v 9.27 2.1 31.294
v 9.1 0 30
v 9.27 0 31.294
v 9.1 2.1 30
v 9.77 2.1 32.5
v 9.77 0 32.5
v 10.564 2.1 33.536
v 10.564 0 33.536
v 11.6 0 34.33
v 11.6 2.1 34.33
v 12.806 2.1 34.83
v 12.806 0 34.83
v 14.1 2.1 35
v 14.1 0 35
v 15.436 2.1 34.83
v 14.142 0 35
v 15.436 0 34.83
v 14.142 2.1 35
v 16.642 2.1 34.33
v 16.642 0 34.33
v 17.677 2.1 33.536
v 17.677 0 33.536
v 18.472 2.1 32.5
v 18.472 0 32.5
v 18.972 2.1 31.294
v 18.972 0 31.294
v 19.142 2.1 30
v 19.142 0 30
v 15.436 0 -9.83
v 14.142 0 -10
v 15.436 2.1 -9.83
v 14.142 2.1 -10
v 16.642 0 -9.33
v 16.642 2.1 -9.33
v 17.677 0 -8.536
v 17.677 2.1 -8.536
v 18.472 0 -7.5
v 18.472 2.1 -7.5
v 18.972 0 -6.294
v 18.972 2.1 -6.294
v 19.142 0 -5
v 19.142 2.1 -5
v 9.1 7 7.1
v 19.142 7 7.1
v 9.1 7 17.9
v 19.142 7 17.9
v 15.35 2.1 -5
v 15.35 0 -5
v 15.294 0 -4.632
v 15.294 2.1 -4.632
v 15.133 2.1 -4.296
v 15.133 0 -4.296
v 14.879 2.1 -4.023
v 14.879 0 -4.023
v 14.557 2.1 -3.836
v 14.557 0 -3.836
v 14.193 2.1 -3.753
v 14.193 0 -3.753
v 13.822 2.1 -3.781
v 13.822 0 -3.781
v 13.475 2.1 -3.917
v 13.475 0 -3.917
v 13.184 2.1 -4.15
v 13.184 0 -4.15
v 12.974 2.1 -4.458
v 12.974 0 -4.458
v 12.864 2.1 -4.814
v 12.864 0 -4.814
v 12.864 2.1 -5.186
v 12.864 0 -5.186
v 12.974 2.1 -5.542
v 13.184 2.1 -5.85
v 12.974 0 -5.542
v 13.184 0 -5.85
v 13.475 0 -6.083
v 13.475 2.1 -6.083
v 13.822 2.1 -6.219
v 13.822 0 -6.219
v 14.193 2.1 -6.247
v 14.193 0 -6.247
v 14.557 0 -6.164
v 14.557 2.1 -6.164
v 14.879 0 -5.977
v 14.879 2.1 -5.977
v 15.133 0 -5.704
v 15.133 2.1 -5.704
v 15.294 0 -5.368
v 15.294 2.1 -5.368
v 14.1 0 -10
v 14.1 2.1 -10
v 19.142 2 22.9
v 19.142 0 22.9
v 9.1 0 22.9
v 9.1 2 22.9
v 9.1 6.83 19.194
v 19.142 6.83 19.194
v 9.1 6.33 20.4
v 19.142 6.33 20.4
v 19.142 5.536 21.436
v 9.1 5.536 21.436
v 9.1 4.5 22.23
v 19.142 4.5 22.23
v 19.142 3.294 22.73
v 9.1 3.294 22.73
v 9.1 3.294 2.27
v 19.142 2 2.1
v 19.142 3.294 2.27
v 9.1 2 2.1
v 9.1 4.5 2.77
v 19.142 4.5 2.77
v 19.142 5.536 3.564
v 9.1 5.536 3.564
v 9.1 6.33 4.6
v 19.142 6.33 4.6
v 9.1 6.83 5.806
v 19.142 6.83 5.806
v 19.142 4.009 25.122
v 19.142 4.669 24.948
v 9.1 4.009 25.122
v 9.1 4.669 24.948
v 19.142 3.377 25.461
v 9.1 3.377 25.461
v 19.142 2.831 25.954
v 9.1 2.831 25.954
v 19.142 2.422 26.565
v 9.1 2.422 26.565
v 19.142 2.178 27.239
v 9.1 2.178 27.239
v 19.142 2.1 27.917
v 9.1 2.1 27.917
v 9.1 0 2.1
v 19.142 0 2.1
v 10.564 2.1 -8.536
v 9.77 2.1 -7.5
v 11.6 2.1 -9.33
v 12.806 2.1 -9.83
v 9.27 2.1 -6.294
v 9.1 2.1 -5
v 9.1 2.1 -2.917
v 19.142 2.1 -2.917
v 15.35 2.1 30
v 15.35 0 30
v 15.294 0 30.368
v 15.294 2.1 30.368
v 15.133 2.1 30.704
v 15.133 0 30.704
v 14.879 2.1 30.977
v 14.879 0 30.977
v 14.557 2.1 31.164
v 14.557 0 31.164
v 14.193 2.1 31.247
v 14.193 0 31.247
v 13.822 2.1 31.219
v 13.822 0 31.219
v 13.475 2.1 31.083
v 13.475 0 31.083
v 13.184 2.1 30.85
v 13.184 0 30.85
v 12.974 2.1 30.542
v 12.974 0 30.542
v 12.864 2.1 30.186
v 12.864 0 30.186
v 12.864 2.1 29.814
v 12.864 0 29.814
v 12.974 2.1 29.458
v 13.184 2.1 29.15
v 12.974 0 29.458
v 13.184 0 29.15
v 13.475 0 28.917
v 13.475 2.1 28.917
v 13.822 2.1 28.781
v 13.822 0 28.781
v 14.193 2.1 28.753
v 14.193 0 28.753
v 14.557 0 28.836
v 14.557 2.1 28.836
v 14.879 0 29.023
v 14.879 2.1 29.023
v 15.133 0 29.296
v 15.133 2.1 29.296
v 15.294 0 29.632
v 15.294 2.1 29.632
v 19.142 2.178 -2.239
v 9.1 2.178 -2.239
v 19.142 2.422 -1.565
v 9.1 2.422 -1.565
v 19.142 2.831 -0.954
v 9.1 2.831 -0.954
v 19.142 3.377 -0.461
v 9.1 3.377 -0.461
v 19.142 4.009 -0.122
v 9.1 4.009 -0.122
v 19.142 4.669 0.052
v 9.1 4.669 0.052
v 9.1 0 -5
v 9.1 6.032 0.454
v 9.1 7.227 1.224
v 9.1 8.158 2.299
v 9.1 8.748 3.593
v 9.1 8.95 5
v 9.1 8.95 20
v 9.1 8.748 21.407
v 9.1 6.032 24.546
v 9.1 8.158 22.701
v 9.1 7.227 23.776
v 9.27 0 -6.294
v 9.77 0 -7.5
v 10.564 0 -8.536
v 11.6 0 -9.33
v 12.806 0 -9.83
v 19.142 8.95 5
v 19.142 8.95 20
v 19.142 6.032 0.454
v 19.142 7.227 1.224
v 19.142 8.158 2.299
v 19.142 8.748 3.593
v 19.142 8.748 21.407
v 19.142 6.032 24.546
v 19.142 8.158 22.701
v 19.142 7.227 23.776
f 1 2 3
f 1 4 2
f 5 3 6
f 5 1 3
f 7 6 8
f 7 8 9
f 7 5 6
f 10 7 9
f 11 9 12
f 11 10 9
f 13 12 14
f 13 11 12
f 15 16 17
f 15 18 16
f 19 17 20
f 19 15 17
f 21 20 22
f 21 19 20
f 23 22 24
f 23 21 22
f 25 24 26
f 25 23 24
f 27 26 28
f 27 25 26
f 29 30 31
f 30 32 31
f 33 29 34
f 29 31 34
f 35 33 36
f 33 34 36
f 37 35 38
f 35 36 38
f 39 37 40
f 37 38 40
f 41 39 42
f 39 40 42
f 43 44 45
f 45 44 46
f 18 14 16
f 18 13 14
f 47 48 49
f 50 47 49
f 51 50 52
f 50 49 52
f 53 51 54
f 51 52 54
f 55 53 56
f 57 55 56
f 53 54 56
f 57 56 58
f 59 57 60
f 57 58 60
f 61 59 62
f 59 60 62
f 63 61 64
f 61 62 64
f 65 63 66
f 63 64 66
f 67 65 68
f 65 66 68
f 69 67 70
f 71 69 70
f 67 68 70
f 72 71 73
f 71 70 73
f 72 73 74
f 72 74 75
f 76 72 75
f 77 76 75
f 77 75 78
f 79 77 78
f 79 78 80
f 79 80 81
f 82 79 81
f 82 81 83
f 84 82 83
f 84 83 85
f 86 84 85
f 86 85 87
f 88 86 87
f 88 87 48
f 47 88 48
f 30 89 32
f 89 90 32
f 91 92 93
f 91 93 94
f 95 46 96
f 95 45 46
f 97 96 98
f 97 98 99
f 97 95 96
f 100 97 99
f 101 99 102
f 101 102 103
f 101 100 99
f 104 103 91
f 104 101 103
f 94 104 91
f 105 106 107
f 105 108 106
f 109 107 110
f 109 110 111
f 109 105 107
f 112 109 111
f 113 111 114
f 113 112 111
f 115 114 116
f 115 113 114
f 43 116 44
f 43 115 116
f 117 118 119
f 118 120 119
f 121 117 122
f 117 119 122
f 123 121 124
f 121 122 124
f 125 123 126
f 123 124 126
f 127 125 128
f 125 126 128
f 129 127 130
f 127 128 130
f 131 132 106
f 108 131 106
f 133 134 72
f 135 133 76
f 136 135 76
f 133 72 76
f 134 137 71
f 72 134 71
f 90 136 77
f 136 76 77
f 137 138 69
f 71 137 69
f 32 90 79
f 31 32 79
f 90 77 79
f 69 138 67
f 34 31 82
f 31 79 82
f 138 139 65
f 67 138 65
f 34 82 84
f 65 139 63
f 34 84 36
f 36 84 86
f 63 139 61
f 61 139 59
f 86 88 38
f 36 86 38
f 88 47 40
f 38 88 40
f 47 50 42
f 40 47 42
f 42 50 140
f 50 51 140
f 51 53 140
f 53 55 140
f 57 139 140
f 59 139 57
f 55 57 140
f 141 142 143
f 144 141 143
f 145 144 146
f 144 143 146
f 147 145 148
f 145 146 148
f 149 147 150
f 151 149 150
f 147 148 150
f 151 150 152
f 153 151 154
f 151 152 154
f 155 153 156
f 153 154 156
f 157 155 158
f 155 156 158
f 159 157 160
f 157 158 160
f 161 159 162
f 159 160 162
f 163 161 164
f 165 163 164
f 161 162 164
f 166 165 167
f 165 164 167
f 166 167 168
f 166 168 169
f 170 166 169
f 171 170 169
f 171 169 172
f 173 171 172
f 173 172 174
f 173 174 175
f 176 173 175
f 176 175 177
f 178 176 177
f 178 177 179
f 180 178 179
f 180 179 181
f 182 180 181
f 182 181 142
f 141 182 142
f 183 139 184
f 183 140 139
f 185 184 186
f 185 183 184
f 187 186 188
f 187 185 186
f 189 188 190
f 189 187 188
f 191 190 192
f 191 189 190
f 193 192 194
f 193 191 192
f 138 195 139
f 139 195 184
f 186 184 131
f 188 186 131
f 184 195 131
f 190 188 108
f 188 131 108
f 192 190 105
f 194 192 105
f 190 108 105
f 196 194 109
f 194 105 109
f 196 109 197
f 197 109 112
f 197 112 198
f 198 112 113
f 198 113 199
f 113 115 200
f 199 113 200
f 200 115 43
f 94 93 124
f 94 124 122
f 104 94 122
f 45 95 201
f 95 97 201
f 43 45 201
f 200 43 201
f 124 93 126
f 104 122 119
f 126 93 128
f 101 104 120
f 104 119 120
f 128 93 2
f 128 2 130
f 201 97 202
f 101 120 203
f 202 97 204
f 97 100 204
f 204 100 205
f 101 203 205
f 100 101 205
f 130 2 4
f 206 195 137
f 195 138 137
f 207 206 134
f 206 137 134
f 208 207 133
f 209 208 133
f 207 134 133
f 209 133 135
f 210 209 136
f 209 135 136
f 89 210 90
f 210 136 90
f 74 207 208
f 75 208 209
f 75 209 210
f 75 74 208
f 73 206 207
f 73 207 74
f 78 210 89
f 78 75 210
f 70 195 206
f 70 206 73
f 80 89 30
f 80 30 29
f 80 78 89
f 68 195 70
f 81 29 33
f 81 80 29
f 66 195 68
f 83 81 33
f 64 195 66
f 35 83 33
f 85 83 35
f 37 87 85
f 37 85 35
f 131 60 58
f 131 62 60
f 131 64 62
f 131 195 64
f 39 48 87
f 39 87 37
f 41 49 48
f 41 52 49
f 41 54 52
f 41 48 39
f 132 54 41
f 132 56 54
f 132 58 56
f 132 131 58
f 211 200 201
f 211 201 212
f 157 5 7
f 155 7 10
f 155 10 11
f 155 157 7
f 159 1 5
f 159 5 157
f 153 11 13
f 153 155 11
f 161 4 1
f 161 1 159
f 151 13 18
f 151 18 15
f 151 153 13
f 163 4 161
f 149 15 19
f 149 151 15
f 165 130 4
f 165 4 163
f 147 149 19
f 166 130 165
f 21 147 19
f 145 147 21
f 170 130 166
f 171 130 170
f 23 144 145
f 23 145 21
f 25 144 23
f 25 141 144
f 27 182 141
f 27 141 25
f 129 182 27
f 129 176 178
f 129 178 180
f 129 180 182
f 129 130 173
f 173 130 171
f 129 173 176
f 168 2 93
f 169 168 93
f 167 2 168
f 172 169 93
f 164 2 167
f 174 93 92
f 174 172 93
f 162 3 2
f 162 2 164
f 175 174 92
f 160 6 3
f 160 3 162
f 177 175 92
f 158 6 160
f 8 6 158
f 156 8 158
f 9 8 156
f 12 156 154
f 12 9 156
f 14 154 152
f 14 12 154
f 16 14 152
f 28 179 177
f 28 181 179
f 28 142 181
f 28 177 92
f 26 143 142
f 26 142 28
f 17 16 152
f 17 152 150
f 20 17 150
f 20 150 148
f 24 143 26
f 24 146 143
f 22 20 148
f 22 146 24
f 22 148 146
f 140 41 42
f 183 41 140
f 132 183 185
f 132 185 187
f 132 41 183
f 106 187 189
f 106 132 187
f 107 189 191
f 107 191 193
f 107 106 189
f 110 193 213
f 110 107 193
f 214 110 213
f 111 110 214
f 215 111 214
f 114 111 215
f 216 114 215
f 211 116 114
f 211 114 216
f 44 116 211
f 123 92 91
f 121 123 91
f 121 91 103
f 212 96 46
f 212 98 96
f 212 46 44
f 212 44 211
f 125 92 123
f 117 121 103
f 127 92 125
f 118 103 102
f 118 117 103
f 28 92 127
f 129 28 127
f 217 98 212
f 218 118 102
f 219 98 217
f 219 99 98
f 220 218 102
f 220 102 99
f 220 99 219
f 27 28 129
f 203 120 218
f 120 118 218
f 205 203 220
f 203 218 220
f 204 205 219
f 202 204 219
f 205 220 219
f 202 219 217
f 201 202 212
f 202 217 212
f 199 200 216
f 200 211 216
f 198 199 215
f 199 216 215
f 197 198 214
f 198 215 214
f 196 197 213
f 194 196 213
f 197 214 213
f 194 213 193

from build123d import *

# Parameters (mm, degrees)
F0_W          = 10.0419273615
F0_H          = 2.1
F0_H_2        = 6.8497342706
F1_DEPTH      = 25
F3_DEPTH      = 10
F3_DEPTH_BACK = 35
F4_W          = 7
F4_H          = 20.8
F5_DEPTH      = 10.0429273615
F6_R          = 1.25
F7_DEPTH      = 25
F8_R          = 5
F9_R          = 3


with BuildPart() as f1:
    # F0 (on Top) → F1 (new body)
    with BuildSketch(Plane.XY):
        with Locations((14.1209636807, 1.05)):
            Rectangle(F0_W, F0_H)
        with Locations((14.1209636807, 5.5248671353)):
            Rectangle(F0_W, F0_H_2)
    extrude(amount=F1_DEPTH)

    # F0 (on Top) → F3 (join, two sides)
    with BuildSketch(Plane.XY) as f3_sk:
        with Locations((14.1209636807, 1.05)):
            Rectangle(F0_W, F0_H)
    extrude(amount=-F3_DEPTH)
    extrude(f3_sk.sketch, amount=F3_DEPTH_BACK)

    # F4 (on offset) → F5 (cut, through all)
    with BuildSketch(Plane.YZ.offset(19.1419273615)):
        with Locations((3.5, 12.5)):
            Rectangle(F4_W, F4_H)
    extrude(amount=-F5_DEPTH, mode=Mode.SUBTRACT)

    # F6 (on Front) → F7 (cut)
    with BuildSketch(Plane.XZ):
        with Locations((14.1, 30)):
            Circle(F6_R)
        with Locations((14.1, -5)):
            Circle(F6_R)
    extrude(amount=-F7_DEPTH, mode=Mode.SUBTRACT)

    # F8
    f8_edges = [f1.edges().sort_by_distance(p)[0] for p in [
        (19.141927, 1.05, 35),
        (9.1, 1.05, 35),
        (9.1, 1.05, -10),
        (19.141927, 1.05, -10),
        (14.120964, 7, 2.1),
        (14.120964, 7, 22.9),
        (14.120964, 8.949734, 0),
        (14.120964, 8.949734, 25),
    ]]
    fillet(f8_edges, radius=F8_R)

    # F9
    f9_edges = [f1.edges().sort_by_distance(p)[0] for p in [
        (14.120964, 2.1, 0),
        (14.120964, 2.1, 25),
    ]]
    fillet(f9_edges, radius=F9_R)


solid = f1.part
